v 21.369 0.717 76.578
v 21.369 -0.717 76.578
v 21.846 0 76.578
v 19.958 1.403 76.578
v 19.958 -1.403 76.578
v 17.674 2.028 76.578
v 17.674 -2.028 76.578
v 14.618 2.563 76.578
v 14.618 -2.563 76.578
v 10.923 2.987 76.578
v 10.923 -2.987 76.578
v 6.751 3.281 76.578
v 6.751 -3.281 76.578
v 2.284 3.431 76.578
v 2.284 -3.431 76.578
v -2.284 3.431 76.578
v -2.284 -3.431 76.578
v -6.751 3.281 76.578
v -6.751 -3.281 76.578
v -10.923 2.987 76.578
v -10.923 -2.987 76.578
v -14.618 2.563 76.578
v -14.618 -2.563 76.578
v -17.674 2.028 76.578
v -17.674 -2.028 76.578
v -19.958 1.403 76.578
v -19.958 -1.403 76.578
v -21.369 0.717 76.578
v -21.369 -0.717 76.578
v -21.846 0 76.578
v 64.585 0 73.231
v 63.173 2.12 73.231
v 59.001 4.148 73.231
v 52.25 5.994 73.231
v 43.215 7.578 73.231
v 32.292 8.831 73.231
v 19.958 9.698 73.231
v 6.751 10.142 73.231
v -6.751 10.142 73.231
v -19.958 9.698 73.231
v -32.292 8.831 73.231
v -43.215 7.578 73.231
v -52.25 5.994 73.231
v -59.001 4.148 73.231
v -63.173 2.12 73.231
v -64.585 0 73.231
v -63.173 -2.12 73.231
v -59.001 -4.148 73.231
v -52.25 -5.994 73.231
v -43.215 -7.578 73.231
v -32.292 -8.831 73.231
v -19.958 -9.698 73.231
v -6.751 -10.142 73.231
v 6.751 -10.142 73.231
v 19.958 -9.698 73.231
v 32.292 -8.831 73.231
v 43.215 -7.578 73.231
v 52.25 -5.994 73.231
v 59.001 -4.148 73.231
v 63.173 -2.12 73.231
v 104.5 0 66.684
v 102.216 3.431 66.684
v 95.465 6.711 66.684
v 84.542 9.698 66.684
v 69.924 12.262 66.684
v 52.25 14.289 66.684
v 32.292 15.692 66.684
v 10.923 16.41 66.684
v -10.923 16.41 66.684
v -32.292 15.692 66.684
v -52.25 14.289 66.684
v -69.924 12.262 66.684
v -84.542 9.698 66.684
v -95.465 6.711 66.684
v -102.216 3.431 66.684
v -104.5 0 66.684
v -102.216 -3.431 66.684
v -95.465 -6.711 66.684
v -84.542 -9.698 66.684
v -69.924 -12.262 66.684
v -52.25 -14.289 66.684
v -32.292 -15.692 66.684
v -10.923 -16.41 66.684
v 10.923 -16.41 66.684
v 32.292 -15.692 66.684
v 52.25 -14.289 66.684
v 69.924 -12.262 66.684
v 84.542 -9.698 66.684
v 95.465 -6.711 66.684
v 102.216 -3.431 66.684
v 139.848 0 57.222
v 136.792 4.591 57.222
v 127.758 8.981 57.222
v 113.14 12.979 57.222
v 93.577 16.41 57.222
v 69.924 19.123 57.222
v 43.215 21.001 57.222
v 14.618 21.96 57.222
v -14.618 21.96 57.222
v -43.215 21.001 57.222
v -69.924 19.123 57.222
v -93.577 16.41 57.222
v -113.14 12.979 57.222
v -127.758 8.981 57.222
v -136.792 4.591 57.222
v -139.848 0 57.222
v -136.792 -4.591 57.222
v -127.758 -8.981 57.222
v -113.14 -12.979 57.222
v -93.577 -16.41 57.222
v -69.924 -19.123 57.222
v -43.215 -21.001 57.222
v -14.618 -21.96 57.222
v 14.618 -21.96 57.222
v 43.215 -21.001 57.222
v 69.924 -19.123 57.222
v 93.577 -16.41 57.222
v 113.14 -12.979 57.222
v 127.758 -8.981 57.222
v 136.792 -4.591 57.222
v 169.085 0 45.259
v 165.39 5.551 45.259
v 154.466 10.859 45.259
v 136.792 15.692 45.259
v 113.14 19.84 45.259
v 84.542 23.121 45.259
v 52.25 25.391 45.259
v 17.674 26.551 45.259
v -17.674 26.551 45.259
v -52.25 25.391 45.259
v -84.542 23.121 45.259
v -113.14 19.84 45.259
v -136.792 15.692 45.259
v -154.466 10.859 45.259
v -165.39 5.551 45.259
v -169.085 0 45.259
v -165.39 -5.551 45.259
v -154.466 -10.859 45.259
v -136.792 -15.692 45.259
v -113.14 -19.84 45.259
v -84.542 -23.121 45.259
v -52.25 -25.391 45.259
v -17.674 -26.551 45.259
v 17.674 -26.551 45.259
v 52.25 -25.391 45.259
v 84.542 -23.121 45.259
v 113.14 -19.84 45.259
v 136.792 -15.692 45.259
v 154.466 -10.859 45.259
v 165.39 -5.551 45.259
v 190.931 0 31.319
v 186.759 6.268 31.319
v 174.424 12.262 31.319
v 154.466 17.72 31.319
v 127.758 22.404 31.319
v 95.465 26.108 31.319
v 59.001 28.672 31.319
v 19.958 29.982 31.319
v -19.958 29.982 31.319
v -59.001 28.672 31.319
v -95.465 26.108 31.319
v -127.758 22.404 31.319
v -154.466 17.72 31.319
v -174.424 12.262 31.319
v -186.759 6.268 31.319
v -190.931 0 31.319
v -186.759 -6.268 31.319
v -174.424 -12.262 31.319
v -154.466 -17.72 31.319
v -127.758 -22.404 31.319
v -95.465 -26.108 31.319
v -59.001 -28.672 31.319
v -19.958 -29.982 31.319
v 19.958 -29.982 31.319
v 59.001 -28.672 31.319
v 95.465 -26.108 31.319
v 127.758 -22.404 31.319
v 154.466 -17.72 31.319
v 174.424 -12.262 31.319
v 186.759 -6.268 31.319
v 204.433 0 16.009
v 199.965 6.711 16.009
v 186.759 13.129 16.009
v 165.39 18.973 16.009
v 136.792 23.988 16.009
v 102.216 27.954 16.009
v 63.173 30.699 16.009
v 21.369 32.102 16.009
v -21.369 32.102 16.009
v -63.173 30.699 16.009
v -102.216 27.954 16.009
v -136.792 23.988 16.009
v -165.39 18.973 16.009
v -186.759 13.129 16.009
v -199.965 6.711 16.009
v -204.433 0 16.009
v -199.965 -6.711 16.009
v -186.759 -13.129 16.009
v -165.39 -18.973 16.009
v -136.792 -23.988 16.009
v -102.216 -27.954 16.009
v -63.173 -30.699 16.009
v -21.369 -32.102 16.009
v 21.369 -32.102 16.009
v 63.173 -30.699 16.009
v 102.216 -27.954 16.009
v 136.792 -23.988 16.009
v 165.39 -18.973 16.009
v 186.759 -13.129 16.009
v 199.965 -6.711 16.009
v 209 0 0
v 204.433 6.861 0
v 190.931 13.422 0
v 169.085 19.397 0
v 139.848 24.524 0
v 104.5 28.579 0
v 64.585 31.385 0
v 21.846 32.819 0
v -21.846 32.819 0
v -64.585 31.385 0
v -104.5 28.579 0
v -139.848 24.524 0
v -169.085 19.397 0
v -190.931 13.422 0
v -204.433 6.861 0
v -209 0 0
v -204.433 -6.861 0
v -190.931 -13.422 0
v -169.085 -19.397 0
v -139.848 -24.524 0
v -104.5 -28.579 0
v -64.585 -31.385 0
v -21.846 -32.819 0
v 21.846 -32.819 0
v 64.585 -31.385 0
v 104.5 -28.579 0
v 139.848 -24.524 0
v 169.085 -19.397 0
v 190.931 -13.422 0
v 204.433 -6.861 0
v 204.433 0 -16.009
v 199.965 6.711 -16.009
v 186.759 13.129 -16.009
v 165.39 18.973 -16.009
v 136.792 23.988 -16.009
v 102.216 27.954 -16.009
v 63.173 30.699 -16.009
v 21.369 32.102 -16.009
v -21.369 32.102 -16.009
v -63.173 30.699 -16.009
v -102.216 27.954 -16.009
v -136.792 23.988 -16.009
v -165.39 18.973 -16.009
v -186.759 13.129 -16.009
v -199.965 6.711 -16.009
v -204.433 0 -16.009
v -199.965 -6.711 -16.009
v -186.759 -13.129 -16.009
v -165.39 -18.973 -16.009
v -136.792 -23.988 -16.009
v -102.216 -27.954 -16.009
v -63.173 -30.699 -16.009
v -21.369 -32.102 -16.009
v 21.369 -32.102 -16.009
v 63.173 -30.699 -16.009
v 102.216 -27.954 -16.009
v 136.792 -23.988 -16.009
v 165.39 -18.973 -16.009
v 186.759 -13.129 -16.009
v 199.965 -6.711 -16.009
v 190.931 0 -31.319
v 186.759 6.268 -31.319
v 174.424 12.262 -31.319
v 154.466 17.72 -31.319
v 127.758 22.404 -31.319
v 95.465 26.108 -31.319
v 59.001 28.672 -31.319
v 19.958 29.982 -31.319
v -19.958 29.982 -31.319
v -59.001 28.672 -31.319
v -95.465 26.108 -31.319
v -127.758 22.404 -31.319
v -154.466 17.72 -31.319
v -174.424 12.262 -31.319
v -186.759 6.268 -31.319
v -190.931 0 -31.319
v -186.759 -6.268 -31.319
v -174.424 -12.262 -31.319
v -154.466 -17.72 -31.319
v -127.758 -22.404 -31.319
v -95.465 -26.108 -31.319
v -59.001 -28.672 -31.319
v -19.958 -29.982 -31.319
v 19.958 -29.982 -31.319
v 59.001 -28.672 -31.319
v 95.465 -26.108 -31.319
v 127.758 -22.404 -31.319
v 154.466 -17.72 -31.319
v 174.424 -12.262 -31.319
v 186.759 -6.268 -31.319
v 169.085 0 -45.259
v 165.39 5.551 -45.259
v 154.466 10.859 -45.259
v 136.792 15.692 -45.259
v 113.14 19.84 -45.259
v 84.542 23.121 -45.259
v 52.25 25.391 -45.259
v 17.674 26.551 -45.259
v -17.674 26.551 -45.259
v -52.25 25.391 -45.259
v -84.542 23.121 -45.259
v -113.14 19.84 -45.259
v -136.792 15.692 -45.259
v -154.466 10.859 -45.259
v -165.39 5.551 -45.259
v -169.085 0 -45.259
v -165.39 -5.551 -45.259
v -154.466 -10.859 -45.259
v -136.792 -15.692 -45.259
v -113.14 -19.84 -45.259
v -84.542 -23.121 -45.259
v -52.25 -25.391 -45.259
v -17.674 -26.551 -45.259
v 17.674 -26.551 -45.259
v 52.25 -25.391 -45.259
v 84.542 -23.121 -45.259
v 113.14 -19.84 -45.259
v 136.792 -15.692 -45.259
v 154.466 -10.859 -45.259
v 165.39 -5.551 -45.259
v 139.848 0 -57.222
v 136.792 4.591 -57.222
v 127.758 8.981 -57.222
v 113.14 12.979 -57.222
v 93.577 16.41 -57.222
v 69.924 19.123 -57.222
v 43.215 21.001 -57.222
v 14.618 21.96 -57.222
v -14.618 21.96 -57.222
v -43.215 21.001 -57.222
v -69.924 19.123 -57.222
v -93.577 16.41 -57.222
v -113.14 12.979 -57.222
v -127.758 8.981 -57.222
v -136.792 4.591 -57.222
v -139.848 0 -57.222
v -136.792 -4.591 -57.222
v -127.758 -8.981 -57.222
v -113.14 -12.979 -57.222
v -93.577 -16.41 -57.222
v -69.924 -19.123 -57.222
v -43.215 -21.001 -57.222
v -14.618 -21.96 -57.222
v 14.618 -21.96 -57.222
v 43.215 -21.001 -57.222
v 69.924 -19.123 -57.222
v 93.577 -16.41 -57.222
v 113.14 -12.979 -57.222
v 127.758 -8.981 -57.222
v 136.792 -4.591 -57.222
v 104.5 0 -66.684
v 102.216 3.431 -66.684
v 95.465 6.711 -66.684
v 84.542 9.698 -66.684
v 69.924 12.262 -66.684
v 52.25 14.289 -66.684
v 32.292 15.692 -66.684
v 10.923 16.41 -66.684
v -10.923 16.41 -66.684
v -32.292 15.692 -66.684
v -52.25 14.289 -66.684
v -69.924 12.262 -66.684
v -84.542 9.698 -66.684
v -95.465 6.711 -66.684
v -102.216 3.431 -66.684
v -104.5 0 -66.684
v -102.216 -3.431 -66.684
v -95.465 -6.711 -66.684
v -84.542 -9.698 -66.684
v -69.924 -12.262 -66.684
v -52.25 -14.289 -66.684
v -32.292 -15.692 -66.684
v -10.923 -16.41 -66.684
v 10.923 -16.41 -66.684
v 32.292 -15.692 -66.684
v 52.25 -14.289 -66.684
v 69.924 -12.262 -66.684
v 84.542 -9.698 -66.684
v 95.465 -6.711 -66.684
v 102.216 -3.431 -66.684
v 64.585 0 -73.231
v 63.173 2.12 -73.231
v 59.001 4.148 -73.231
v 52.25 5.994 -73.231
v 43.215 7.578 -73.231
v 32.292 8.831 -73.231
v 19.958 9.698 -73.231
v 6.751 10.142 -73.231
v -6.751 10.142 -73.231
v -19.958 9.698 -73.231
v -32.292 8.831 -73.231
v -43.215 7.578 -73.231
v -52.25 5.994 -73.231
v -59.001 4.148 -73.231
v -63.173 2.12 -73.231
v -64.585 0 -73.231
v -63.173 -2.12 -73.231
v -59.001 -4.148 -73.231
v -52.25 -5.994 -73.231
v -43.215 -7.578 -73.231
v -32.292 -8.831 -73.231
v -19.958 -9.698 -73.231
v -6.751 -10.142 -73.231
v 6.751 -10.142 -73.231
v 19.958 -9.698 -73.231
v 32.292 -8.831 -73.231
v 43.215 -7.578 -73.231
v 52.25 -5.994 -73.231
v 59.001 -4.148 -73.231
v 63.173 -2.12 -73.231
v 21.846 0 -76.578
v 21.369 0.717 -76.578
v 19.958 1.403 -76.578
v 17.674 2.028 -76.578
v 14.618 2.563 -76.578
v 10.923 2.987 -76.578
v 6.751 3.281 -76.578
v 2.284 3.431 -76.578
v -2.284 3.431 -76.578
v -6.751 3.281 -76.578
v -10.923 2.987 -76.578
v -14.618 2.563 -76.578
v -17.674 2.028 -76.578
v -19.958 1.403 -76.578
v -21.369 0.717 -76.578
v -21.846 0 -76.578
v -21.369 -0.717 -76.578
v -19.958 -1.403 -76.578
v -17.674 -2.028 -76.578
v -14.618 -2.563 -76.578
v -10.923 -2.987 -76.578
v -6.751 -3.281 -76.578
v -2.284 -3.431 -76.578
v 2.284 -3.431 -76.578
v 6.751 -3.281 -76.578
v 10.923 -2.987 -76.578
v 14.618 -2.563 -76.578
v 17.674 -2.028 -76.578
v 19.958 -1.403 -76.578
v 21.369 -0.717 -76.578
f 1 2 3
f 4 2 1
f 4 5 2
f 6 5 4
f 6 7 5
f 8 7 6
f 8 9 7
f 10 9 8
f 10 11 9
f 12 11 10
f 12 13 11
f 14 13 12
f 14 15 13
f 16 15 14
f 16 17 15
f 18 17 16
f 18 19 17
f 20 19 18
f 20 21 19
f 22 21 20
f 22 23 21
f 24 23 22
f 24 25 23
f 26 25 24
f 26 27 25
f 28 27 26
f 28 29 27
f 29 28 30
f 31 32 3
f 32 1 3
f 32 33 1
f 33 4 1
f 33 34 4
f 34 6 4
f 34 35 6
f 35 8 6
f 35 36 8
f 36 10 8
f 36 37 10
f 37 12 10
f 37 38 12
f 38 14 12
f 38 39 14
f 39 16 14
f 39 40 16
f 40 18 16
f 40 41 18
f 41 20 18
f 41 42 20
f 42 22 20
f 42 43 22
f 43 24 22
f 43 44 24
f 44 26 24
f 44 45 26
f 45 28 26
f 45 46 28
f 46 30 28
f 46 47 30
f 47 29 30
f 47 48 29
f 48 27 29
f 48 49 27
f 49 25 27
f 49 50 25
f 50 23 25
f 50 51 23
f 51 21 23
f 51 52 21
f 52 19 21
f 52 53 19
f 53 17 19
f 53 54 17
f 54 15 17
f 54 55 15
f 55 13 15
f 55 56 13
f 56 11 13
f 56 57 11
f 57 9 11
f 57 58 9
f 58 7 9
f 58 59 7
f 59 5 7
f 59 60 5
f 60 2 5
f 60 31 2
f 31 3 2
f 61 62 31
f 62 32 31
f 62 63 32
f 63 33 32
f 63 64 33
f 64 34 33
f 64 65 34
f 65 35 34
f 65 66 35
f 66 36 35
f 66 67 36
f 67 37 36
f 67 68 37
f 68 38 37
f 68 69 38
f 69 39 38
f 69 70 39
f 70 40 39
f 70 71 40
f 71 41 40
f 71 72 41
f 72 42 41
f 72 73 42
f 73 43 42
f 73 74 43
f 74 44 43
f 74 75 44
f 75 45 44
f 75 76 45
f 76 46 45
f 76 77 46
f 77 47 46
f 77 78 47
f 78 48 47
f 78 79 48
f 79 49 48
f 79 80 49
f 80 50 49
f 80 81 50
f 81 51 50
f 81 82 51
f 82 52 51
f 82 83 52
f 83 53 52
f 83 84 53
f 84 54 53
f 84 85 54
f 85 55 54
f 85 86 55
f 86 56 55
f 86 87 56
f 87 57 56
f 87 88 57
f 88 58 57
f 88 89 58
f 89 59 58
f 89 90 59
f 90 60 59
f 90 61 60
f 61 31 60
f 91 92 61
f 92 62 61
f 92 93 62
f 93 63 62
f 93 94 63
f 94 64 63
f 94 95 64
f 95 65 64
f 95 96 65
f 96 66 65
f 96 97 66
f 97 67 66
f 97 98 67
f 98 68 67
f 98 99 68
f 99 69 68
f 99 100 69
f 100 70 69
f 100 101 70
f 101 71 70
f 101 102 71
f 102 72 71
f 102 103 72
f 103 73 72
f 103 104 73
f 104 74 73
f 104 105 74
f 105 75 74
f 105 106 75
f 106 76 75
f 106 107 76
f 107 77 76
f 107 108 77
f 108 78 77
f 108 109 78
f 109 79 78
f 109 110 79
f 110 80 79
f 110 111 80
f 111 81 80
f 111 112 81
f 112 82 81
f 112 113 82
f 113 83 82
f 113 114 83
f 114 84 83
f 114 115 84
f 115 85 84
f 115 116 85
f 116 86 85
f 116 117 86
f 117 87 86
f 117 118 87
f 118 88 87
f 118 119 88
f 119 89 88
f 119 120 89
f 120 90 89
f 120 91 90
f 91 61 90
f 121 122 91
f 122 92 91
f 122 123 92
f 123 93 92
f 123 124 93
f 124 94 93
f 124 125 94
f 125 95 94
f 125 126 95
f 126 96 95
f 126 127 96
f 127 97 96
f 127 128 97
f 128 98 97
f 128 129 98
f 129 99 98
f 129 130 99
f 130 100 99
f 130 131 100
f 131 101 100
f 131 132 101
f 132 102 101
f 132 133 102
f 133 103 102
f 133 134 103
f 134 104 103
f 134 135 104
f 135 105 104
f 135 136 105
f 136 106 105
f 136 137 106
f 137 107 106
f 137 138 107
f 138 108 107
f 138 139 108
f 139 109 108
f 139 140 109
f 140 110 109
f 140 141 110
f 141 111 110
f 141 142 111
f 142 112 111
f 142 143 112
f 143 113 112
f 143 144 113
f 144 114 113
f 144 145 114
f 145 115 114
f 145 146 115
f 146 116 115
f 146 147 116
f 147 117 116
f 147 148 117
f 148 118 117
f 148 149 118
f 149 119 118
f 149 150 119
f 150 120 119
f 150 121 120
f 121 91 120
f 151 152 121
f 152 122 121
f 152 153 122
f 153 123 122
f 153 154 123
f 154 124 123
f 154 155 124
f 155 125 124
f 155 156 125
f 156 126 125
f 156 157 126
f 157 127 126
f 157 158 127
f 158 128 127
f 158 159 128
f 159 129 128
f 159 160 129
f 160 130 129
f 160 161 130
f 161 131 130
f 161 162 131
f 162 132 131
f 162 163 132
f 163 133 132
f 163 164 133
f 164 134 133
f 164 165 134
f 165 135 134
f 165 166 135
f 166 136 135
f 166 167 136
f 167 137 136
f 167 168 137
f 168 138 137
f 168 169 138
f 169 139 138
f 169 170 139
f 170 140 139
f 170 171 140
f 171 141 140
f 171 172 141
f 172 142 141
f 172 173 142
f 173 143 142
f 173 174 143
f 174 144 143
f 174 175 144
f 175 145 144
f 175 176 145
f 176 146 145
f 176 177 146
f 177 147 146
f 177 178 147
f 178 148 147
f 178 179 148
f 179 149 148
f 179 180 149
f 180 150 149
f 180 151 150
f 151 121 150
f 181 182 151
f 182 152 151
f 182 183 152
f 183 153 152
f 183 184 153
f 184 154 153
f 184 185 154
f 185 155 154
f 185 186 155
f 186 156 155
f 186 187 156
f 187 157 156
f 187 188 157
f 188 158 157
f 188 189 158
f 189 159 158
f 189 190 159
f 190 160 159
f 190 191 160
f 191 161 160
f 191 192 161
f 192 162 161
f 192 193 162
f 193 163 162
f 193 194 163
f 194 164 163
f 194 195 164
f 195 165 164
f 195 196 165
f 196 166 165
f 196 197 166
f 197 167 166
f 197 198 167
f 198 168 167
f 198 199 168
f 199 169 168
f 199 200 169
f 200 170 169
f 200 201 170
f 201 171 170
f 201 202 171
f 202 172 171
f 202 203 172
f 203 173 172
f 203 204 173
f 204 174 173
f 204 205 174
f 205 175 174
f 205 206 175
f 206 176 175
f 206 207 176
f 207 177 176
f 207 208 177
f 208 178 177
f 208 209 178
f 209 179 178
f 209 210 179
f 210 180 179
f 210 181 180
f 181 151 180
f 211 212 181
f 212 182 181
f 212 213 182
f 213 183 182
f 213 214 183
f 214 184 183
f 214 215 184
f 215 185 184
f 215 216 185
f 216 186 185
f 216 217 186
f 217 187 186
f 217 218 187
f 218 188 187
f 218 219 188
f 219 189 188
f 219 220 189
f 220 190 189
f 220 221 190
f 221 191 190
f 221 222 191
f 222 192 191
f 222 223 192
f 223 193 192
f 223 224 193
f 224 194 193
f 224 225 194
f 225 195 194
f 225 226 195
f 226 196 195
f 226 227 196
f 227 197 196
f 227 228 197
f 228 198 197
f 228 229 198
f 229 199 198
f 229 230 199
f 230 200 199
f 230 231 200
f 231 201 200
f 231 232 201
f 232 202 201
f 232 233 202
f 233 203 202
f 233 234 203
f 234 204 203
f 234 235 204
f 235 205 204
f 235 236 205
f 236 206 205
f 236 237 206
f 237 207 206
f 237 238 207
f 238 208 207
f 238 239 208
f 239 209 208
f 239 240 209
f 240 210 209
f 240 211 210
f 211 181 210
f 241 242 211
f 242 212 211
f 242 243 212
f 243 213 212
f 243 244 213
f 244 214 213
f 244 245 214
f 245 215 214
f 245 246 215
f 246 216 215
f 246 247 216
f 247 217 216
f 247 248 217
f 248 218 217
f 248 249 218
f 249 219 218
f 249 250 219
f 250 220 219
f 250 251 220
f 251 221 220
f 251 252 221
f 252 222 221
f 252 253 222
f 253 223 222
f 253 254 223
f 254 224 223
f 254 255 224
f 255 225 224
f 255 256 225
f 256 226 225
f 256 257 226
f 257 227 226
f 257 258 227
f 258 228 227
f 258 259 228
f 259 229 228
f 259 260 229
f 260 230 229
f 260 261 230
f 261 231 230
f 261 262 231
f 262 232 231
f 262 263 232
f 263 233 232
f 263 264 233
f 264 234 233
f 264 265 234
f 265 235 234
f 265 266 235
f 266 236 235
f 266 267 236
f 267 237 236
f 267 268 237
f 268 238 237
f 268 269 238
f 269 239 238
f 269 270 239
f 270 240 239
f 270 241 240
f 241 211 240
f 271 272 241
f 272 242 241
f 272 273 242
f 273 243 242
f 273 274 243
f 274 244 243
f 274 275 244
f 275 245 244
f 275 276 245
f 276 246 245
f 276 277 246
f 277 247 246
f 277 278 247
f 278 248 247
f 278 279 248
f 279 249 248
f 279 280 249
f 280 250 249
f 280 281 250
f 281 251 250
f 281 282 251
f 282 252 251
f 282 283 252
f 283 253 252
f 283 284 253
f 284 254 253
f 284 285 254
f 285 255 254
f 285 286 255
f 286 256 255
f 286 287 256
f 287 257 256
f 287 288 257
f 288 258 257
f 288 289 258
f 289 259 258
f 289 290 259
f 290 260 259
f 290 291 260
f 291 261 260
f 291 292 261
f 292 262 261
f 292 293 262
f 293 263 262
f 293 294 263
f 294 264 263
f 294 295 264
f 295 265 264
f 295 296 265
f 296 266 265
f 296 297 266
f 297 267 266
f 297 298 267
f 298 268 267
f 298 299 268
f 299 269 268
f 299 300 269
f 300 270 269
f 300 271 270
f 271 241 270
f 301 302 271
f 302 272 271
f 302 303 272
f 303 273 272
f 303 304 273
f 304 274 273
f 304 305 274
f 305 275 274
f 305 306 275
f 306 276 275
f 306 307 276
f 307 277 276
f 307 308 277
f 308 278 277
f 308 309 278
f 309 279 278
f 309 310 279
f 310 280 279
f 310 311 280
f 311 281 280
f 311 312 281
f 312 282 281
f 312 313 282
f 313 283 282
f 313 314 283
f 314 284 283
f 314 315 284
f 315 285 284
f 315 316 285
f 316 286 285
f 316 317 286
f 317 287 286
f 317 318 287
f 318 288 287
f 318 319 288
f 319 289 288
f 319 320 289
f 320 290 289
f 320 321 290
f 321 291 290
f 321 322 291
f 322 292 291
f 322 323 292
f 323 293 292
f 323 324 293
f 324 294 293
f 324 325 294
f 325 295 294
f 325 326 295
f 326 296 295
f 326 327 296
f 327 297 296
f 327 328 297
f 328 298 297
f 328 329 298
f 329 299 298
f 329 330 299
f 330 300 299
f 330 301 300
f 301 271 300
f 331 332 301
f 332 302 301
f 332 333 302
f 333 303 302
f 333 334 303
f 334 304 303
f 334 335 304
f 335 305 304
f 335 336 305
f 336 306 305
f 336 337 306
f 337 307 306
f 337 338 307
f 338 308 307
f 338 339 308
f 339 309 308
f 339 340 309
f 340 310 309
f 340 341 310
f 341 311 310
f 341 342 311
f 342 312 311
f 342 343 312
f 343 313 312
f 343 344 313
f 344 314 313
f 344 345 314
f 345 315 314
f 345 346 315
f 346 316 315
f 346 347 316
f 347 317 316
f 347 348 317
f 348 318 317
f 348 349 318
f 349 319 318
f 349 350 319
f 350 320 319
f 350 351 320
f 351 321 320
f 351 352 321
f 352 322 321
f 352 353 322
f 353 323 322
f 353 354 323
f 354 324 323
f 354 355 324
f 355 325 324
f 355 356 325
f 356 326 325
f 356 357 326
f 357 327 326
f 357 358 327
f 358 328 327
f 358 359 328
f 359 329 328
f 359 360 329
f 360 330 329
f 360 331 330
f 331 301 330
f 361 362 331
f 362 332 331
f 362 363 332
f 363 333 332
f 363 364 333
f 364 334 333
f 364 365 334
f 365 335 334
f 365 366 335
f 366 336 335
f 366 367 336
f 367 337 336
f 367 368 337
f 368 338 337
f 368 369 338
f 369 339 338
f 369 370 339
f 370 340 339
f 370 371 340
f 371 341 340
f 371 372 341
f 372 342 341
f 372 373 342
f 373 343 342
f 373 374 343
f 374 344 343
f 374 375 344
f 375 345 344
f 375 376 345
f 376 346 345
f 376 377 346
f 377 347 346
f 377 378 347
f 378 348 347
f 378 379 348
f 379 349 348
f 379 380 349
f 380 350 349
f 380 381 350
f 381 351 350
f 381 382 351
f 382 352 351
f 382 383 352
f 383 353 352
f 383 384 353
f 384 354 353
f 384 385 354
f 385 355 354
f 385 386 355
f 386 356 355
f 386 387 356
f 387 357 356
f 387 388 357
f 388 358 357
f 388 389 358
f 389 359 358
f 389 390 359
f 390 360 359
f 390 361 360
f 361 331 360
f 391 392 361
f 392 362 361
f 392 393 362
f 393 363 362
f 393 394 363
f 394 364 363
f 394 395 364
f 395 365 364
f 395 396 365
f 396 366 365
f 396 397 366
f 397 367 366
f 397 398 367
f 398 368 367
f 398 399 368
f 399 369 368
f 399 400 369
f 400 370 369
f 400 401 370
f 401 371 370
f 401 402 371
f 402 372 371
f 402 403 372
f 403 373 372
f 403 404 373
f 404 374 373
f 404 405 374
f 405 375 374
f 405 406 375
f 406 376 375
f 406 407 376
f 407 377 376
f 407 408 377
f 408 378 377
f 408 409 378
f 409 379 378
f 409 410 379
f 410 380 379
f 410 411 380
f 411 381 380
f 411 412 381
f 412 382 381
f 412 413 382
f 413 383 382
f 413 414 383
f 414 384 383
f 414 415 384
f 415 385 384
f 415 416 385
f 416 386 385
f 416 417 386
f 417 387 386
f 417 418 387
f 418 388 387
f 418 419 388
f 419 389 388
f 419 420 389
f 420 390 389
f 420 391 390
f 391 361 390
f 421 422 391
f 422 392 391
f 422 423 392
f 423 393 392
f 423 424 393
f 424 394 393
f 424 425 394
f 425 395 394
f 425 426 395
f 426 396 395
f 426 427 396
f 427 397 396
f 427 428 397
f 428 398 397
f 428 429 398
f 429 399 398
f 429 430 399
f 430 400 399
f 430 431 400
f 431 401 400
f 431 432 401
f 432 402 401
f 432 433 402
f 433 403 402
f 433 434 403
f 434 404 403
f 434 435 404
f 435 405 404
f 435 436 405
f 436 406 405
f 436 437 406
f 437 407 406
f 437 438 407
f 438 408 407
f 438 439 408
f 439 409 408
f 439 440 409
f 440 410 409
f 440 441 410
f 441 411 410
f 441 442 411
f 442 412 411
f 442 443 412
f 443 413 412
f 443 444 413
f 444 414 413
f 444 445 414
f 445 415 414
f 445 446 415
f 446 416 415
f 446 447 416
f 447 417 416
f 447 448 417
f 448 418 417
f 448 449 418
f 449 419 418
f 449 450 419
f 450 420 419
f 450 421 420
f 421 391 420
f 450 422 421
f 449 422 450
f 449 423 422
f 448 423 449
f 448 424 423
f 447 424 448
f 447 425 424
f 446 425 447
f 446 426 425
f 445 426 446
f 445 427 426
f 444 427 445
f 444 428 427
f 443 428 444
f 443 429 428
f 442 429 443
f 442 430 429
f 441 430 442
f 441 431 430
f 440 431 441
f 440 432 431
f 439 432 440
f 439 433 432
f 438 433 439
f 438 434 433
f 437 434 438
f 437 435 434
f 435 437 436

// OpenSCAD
// Generated by SolidPython 1.0.1 on 2020-07-29 00:46:53


scale(v = [19, 3, 7]) {
	sphere(r = 11);
}
/***********************************************
*********      SolidPython code:      **********
************************************************
 
# import packages: SolidPython
from solid import *
from solid.utils import *
from itertools import chain, combinations, permutations


class Resize:

    def __init__(self, scad_file):
        self.scad_file = scad_file
        #self.scad_file = import_scad(scad_file)
        # cone/cylinder param:
        self.r1 = 0
        self.r2 = 0
        self.h = 0
        # rectangular prism param:
        self.w = 0
        self.l = 0
        # ellipse param:
        self.r = 0

    # import OpenScad code (file name corresponds to shape)


    # classify shape + parameters
    def assign(self, param1, param2, param3):
        if self.scad_file == 'cone.scad':
            self.r1 = param1
            self.r2 = param2
            self.h = param3
        elif self.scad_file == 'cylinder.scad':
            self.r1 = param1
            self.r2 = param2
            self.h = param3
        elif self.scad_file == 'rectangularPrism.scad':
            self.h = param1
            self.l = param2
            self.w = param3
        else:
            self.r = param1
            self.h = param2

    # resize parameters
    def iterate(self):
        x = range(3, 20, 2)
        i = 1
        if self.scad_file == 'cone.scad':
            tempList = list(permutations(x, 2))
            for temp in tempList:
                param1 = temp[0]
                param2 = temp[1]
                filepath = 'produced_scad_files/' + 'cone' + str(param1) + '_' + str(param2) + '_' + '.scad'
                scad_render_to_file(cylinder(h=param1, r1=param2, r2=0), filepath)

        elif self.scad_file == 'cylinder.scad':
            tempList = list(permutations(x, 3))
            for temp in tempList:
                param1 = temp[0]
                param2 = temp[1]
                filepath = 'produced_scad_files/' + 'cylinder' + str(param1) + '_' + str(param2) + '_' + '.scad'
                scad_render_to_file(cylinder(h=param1, r1=param2, r2=param2), filepath)

        elif self.scad_file == 'rectangularPrism.scad':
            tempList = list(permutations(x, 3))
            for temp in tempList:
                param1 = temp[0]
                param2 = temp[1]
                param3 = temp[2]
                filepath = 'produced_scad_files/' + 'rectangularPrism' + str(param1) + '_' + str(param2) + '_' + str(
                    param3) + '.scad'
                scad_render_to_file(cube(size=(param1, param2, param3)), filepath)

        elif self.scad_file == 'ellipse.scad':
            tempList = list(permutations(x, 4))
            for temp in tempList:
                param1 = temp[0]
                param2 = temp[1]
                param3 = temp[2]
                param4 = temp[3]
                filepath = 'produced_scad_files/' + 'ellipse' + str(param1) + '_' + str(param2) + '_' + str(param3) + '_' + str(param4) + '.scad'
                scad_render_to_file(scale([param1, param2, param3])(sphere(r=param4)), filepath)

    def render_to_scadfile(self):
        scad_render_to_file(scad, 'example.scad') 
 
************************************************/
